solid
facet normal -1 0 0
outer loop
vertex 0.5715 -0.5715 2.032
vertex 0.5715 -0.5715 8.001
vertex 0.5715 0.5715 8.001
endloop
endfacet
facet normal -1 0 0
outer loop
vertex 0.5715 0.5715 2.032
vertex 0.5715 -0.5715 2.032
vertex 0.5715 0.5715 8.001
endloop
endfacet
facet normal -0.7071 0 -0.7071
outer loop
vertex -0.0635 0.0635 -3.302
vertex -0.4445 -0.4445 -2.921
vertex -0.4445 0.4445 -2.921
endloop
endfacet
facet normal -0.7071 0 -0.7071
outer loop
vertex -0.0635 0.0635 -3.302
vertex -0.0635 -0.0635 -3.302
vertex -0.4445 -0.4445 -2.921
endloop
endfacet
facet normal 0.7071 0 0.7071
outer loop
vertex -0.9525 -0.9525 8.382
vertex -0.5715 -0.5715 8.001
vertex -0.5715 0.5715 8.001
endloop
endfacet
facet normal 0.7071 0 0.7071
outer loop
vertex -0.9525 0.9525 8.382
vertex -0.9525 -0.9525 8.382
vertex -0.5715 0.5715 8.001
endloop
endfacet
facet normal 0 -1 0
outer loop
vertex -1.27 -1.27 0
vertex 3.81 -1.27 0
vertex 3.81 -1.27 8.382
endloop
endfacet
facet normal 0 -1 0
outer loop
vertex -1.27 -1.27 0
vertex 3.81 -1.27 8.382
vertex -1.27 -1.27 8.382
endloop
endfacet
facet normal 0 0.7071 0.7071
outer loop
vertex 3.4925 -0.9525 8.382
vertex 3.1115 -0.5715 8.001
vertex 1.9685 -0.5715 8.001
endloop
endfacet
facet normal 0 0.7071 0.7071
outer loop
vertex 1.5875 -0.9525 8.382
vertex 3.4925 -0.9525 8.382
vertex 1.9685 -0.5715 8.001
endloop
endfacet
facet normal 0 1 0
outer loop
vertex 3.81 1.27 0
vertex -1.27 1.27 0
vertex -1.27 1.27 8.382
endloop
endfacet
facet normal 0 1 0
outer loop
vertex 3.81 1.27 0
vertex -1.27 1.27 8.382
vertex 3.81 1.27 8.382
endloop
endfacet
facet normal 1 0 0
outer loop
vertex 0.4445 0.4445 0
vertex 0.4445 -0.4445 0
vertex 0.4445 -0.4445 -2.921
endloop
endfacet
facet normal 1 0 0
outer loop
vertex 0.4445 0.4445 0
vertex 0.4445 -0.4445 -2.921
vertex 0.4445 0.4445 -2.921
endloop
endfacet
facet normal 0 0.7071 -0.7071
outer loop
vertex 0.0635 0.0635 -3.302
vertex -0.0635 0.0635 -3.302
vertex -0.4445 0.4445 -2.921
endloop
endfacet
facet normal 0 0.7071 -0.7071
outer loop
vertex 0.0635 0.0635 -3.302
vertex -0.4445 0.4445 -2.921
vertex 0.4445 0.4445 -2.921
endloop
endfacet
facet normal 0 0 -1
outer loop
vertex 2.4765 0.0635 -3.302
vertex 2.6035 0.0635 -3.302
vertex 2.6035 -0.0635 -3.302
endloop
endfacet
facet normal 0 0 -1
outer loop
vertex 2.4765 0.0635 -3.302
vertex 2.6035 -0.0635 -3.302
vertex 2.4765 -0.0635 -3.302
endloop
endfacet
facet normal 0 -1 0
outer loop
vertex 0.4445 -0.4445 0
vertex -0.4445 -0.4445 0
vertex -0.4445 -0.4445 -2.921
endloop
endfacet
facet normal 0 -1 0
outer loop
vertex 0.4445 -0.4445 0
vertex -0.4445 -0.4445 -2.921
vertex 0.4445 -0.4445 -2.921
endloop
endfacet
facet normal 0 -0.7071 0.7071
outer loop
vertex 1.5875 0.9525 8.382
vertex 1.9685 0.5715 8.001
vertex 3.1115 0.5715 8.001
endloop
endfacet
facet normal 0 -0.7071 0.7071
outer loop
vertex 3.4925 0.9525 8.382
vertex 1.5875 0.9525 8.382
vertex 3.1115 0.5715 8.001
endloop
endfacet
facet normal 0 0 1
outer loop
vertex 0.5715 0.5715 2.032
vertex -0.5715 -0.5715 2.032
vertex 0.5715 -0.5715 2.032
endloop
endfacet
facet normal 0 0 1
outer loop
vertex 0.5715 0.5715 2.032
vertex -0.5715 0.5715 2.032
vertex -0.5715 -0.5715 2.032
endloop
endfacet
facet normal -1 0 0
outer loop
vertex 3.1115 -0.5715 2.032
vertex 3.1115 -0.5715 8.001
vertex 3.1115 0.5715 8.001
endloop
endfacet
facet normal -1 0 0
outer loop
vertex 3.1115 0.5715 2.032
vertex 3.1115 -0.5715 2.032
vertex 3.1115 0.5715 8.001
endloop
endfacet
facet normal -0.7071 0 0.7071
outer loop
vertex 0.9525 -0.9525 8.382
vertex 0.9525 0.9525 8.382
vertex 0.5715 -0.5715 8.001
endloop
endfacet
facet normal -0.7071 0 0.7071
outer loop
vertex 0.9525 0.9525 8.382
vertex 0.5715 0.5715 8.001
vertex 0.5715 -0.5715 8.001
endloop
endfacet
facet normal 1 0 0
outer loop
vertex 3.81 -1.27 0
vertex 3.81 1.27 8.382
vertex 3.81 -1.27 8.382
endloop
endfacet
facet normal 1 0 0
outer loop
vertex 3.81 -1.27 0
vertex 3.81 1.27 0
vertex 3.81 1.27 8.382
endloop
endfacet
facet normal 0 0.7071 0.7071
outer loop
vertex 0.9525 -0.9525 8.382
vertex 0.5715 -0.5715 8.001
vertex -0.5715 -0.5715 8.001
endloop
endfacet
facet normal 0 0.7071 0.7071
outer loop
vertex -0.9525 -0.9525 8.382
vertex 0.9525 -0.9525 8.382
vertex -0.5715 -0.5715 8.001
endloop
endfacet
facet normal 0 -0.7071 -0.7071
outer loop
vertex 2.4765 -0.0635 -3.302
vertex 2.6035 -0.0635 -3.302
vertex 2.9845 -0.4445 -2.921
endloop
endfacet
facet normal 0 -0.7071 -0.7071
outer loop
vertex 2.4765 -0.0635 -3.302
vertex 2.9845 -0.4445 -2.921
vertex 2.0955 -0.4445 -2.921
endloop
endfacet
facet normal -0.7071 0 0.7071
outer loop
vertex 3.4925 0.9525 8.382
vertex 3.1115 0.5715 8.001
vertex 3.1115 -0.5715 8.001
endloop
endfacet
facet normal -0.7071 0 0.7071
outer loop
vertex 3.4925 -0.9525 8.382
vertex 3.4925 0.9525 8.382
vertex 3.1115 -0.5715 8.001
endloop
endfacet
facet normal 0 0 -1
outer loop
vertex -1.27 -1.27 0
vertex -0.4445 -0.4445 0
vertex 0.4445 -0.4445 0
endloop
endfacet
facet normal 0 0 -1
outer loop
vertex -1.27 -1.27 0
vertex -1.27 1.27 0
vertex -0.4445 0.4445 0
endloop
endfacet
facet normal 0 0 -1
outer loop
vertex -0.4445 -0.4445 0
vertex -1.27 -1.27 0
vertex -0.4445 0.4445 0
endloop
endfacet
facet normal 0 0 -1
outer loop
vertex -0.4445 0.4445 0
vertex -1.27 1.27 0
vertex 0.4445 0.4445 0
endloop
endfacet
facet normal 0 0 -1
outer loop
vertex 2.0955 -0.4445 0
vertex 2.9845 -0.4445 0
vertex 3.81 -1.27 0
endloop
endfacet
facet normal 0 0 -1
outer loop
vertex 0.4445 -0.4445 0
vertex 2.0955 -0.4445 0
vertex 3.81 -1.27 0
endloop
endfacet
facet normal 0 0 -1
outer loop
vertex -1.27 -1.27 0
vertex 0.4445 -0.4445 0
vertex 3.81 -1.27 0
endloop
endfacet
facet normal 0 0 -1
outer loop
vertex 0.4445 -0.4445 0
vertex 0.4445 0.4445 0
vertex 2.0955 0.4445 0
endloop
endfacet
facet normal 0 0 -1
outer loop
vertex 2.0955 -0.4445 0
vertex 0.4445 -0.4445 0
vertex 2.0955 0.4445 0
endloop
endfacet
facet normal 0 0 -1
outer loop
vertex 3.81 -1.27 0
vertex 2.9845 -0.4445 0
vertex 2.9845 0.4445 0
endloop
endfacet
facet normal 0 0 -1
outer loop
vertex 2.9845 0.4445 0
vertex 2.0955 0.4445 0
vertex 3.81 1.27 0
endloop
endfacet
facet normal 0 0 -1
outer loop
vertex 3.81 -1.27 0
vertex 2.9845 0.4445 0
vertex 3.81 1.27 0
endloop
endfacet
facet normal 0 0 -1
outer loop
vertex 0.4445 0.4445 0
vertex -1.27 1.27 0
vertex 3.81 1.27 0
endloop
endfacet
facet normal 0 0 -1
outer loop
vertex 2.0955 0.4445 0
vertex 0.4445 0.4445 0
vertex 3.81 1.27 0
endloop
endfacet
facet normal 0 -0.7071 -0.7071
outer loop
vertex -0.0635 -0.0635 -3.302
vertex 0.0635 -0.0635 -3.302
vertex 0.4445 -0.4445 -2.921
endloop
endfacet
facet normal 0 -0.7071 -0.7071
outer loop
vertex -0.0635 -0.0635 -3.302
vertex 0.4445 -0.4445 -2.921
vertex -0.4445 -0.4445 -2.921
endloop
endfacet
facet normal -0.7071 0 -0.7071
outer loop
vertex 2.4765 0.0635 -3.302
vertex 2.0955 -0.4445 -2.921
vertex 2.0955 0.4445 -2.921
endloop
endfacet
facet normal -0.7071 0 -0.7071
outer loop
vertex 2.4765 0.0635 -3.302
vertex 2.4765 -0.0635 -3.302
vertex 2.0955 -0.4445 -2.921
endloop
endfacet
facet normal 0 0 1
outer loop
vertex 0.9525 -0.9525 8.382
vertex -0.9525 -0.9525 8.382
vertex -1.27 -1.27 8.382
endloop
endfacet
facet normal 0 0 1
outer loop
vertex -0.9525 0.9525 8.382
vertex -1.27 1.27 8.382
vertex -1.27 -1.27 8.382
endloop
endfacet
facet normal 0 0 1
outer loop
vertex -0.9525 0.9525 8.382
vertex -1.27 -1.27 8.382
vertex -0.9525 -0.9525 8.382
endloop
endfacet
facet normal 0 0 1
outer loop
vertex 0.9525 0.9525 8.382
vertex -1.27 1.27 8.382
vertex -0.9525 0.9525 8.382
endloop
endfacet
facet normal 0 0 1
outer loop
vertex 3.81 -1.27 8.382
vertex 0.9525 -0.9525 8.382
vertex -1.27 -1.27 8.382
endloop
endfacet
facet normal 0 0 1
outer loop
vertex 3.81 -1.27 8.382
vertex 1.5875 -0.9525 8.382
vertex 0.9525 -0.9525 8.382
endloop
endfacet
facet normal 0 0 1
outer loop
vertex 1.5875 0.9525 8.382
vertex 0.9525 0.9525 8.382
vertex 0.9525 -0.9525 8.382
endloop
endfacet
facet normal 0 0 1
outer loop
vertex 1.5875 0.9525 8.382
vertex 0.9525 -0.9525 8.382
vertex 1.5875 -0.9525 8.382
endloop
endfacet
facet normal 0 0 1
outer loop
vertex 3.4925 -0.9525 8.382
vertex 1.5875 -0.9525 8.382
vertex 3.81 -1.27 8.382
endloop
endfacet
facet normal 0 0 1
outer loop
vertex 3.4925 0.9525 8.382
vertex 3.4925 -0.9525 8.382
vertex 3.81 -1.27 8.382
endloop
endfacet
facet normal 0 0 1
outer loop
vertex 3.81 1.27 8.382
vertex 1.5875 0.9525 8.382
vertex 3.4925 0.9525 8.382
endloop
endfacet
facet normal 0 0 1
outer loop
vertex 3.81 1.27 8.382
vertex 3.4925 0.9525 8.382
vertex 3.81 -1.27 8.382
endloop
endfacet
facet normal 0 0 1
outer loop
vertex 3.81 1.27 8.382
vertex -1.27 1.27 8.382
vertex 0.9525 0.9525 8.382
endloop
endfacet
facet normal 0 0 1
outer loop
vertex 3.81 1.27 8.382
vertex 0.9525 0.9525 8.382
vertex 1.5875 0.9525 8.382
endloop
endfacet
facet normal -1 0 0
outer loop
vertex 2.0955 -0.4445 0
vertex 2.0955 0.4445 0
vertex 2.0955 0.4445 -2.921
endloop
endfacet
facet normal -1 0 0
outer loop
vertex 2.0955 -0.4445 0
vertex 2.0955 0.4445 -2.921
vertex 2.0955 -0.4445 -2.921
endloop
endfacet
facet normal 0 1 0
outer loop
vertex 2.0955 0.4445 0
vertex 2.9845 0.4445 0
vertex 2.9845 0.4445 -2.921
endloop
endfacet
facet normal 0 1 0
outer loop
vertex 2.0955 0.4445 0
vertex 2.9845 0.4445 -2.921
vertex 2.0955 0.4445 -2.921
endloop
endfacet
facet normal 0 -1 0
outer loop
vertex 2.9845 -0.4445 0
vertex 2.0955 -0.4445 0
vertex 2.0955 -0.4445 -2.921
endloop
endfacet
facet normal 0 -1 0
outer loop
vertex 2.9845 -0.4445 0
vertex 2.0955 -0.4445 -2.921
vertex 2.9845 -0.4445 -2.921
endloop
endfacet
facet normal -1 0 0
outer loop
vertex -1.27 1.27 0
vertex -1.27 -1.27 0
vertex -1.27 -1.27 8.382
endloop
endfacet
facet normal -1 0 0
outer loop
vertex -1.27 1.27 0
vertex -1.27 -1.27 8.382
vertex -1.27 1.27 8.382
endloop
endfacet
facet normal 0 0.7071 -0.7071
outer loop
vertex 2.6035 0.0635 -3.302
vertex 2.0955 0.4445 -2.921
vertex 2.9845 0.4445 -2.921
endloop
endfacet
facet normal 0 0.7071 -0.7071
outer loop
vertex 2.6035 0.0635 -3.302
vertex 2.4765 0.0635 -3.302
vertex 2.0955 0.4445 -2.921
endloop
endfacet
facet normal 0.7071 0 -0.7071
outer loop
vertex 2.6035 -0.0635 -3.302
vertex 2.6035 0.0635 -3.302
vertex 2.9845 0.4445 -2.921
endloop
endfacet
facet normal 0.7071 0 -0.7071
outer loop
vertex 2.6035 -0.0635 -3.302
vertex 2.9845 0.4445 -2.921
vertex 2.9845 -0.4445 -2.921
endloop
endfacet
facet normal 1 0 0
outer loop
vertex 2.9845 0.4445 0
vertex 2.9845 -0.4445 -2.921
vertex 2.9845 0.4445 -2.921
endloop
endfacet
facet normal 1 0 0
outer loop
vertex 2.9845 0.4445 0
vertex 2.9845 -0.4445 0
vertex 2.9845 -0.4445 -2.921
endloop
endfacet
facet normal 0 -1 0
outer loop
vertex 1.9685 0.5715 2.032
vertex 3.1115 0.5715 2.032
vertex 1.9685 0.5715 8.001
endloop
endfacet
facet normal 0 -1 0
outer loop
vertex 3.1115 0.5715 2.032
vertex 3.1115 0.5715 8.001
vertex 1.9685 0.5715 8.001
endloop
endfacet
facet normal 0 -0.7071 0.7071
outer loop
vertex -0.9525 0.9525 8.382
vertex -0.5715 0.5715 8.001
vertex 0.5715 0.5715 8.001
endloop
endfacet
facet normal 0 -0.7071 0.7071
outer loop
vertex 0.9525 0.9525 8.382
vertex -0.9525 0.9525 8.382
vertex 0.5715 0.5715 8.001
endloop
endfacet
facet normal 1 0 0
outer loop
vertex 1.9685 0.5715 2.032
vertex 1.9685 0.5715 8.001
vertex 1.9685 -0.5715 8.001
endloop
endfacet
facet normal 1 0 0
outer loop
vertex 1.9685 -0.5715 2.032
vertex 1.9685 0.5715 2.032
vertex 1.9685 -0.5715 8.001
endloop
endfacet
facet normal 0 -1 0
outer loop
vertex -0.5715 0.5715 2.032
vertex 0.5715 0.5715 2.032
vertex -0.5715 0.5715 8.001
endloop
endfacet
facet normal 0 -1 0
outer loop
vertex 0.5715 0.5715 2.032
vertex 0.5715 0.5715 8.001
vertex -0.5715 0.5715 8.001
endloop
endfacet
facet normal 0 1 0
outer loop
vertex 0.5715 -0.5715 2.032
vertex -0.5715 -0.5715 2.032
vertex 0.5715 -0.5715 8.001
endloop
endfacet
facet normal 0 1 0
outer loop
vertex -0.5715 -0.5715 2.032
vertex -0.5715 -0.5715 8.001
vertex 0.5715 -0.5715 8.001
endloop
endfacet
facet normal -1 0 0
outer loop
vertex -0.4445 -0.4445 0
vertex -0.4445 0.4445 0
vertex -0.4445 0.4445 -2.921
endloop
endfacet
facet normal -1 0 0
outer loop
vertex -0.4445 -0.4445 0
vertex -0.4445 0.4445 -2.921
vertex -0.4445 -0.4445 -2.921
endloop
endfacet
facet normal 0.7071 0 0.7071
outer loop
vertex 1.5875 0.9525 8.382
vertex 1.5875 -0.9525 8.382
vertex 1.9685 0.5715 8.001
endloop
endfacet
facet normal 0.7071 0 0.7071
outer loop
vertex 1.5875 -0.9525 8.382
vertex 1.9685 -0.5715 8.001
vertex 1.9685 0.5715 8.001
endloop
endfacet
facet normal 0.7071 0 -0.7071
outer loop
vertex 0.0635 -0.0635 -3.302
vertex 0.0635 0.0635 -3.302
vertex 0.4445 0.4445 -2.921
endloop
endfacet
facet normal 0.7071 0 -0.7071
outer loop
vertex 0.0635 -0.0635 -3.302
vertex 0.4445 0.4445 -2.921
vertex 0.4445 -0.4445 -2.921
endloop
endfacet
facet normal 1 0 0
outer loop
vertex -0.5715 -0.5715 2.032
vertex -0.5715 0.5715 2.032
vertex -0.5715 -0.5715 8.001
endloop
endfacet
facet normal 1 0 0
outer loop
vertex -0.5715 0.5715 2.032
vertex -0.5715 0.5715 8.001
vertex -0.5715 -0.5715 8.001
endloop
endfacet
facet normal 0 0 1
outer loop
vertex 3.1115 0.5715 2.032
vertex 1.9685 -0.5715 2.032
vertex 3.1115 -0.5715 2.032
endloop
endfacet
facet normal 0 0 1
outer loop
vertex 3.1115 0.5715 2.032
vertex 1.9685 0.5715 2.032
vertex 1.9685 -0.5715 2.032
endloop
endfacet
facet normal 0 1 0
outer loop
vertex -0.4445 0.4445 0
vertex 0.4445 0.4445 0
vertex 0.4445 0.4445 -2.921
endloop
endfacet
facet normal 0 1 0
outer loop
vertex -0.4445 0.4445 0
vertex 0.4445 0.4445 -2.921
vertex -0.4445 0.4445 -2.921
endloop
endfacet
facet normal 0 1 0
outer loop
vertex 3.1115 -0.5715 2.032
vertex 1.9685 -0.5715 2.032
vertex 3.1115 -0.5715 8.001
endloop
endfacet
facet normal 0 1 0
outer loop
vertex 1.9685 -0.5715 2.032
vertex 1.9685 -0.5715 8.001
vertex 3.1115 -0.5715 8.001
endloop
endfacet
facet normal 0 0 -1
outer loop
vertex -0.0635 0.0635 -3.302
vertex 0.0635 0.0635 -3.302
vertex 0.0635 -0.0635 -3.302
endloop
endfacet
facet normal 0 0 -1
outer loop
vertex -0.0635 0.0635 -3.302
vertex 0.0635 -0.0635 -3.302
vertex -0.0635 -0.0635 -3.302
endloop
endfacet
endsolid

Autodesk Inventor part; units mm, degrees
ref_plane "YZ Plane" through (0, 0, 0) normal (1, 0, 0) x (0, 1, 0)
ref_plane "XZ Plane" through (0, 0, 0) normal (0, 1, 0) x (-1, 0, 0)
ref_plane "XY Plane" through (0, 0, 0) normal (0, 0, 1) x (1, 0, 0)
sketch "Sketch1" plane through (0, 0, 0) normal (0, 0, 1) x (1, 0, 0)
  line L0 (1.27, -1.27) -> (-1.27, -1.27)
  line L1 (-1.27, -1.27) -> (-1.27, 1.27)
  line L2 (-1.27, 1.27) -> (1.27, 1.27)
  line L3 (1.27, 1.27) -> (1.27, -1.27)
  line L4 (1.27, -1.27) -> (-1.27, 1.27) construction
  line L5 (-1.27, -1.27) -> (1.27, 1.27) construction
  point P0 (0, 0)
  dimension "d0" = 2.54
  dimension "d1" = 2.54
extrude "Extrusion1" add sketch "Sketch1" along normal blind 8.382
sketch "Sketch2" plane through (0, 0, 8.382) normal (0, 0, 1) x (1, 0, 0)
  line L0 (0.5715, 0.5715) -> (-0.5715, 0.5715)
  line L1 (-0.5715, 0.5715) -> (-0.5715, -0.5715)
  line L2 (-0.5715, -0.5715) -> (0.5715, -0.5715)
  line L3 (0.5715, -0.5715) -> (0.5715, 0.5715)
  line L4 (0.5715, 0.5715) -> (-0.5715, -0.5715) construction
  line L5 (-0.5715, 0.5715) -> (0.5715, -0.5715) construction
  point P0 (0, 0)
  dimension "d4" = 1.143
extrude "Extrusion2" cut sketch "Sketch2" against normal blind 6.35
chamfer "Chamfer1" distance 0.381 angle 45 4 edges at (0, 0.5715, 8.382) (-0.5715, 0, 8.382) (0, -0.5715, 8.382) (0.5715, 0, 8.382)
sketch "Sketch3" plane through (0, 0, 0) normal (0, 0, -1) x (-1, 0, 0)
  line L0 (0.4445, -0.4445) -> (-0.4445, -0.4445)
  line L1 (-0.4445, -0.4445) -> (-0.4445, 0.4445)
  line L2 (-0.4445, 0.4445) -> (0.4445, 0.4445)
  line L3 (0.4445, 0.4445) -> (0.4445, -0.4445)
  line L4 (0.4445, -0.4445) -> (-0.4445, 0.4445) construction
  line L5 (-0.4445, -0.4445) -> (0.4445, 0.4445) construction
  point P0 (0, 0)
  dimension "d10" = 0.889
extrude "Extrusion3" add sketch "Sketch3" along normal blind 3.302
chamfer "Chamfer2" distance 0.381 angle 45 4 edges at (0, 0.4445, -3.302) (-0.4445, 0, -3.302) (0, -0.4445, -3.302) (0.4445, 0, -3.302)
pattern_linear "Rectangular Pattern1" count 2 spacing 2.54 along (1, 0, 0) of "Extrusion1", "Extrusion2", "Chamfer1", "Extrusion3", "Chamfer2"
equation "\"d1\" = d0"
properties part number "2  female pin"
